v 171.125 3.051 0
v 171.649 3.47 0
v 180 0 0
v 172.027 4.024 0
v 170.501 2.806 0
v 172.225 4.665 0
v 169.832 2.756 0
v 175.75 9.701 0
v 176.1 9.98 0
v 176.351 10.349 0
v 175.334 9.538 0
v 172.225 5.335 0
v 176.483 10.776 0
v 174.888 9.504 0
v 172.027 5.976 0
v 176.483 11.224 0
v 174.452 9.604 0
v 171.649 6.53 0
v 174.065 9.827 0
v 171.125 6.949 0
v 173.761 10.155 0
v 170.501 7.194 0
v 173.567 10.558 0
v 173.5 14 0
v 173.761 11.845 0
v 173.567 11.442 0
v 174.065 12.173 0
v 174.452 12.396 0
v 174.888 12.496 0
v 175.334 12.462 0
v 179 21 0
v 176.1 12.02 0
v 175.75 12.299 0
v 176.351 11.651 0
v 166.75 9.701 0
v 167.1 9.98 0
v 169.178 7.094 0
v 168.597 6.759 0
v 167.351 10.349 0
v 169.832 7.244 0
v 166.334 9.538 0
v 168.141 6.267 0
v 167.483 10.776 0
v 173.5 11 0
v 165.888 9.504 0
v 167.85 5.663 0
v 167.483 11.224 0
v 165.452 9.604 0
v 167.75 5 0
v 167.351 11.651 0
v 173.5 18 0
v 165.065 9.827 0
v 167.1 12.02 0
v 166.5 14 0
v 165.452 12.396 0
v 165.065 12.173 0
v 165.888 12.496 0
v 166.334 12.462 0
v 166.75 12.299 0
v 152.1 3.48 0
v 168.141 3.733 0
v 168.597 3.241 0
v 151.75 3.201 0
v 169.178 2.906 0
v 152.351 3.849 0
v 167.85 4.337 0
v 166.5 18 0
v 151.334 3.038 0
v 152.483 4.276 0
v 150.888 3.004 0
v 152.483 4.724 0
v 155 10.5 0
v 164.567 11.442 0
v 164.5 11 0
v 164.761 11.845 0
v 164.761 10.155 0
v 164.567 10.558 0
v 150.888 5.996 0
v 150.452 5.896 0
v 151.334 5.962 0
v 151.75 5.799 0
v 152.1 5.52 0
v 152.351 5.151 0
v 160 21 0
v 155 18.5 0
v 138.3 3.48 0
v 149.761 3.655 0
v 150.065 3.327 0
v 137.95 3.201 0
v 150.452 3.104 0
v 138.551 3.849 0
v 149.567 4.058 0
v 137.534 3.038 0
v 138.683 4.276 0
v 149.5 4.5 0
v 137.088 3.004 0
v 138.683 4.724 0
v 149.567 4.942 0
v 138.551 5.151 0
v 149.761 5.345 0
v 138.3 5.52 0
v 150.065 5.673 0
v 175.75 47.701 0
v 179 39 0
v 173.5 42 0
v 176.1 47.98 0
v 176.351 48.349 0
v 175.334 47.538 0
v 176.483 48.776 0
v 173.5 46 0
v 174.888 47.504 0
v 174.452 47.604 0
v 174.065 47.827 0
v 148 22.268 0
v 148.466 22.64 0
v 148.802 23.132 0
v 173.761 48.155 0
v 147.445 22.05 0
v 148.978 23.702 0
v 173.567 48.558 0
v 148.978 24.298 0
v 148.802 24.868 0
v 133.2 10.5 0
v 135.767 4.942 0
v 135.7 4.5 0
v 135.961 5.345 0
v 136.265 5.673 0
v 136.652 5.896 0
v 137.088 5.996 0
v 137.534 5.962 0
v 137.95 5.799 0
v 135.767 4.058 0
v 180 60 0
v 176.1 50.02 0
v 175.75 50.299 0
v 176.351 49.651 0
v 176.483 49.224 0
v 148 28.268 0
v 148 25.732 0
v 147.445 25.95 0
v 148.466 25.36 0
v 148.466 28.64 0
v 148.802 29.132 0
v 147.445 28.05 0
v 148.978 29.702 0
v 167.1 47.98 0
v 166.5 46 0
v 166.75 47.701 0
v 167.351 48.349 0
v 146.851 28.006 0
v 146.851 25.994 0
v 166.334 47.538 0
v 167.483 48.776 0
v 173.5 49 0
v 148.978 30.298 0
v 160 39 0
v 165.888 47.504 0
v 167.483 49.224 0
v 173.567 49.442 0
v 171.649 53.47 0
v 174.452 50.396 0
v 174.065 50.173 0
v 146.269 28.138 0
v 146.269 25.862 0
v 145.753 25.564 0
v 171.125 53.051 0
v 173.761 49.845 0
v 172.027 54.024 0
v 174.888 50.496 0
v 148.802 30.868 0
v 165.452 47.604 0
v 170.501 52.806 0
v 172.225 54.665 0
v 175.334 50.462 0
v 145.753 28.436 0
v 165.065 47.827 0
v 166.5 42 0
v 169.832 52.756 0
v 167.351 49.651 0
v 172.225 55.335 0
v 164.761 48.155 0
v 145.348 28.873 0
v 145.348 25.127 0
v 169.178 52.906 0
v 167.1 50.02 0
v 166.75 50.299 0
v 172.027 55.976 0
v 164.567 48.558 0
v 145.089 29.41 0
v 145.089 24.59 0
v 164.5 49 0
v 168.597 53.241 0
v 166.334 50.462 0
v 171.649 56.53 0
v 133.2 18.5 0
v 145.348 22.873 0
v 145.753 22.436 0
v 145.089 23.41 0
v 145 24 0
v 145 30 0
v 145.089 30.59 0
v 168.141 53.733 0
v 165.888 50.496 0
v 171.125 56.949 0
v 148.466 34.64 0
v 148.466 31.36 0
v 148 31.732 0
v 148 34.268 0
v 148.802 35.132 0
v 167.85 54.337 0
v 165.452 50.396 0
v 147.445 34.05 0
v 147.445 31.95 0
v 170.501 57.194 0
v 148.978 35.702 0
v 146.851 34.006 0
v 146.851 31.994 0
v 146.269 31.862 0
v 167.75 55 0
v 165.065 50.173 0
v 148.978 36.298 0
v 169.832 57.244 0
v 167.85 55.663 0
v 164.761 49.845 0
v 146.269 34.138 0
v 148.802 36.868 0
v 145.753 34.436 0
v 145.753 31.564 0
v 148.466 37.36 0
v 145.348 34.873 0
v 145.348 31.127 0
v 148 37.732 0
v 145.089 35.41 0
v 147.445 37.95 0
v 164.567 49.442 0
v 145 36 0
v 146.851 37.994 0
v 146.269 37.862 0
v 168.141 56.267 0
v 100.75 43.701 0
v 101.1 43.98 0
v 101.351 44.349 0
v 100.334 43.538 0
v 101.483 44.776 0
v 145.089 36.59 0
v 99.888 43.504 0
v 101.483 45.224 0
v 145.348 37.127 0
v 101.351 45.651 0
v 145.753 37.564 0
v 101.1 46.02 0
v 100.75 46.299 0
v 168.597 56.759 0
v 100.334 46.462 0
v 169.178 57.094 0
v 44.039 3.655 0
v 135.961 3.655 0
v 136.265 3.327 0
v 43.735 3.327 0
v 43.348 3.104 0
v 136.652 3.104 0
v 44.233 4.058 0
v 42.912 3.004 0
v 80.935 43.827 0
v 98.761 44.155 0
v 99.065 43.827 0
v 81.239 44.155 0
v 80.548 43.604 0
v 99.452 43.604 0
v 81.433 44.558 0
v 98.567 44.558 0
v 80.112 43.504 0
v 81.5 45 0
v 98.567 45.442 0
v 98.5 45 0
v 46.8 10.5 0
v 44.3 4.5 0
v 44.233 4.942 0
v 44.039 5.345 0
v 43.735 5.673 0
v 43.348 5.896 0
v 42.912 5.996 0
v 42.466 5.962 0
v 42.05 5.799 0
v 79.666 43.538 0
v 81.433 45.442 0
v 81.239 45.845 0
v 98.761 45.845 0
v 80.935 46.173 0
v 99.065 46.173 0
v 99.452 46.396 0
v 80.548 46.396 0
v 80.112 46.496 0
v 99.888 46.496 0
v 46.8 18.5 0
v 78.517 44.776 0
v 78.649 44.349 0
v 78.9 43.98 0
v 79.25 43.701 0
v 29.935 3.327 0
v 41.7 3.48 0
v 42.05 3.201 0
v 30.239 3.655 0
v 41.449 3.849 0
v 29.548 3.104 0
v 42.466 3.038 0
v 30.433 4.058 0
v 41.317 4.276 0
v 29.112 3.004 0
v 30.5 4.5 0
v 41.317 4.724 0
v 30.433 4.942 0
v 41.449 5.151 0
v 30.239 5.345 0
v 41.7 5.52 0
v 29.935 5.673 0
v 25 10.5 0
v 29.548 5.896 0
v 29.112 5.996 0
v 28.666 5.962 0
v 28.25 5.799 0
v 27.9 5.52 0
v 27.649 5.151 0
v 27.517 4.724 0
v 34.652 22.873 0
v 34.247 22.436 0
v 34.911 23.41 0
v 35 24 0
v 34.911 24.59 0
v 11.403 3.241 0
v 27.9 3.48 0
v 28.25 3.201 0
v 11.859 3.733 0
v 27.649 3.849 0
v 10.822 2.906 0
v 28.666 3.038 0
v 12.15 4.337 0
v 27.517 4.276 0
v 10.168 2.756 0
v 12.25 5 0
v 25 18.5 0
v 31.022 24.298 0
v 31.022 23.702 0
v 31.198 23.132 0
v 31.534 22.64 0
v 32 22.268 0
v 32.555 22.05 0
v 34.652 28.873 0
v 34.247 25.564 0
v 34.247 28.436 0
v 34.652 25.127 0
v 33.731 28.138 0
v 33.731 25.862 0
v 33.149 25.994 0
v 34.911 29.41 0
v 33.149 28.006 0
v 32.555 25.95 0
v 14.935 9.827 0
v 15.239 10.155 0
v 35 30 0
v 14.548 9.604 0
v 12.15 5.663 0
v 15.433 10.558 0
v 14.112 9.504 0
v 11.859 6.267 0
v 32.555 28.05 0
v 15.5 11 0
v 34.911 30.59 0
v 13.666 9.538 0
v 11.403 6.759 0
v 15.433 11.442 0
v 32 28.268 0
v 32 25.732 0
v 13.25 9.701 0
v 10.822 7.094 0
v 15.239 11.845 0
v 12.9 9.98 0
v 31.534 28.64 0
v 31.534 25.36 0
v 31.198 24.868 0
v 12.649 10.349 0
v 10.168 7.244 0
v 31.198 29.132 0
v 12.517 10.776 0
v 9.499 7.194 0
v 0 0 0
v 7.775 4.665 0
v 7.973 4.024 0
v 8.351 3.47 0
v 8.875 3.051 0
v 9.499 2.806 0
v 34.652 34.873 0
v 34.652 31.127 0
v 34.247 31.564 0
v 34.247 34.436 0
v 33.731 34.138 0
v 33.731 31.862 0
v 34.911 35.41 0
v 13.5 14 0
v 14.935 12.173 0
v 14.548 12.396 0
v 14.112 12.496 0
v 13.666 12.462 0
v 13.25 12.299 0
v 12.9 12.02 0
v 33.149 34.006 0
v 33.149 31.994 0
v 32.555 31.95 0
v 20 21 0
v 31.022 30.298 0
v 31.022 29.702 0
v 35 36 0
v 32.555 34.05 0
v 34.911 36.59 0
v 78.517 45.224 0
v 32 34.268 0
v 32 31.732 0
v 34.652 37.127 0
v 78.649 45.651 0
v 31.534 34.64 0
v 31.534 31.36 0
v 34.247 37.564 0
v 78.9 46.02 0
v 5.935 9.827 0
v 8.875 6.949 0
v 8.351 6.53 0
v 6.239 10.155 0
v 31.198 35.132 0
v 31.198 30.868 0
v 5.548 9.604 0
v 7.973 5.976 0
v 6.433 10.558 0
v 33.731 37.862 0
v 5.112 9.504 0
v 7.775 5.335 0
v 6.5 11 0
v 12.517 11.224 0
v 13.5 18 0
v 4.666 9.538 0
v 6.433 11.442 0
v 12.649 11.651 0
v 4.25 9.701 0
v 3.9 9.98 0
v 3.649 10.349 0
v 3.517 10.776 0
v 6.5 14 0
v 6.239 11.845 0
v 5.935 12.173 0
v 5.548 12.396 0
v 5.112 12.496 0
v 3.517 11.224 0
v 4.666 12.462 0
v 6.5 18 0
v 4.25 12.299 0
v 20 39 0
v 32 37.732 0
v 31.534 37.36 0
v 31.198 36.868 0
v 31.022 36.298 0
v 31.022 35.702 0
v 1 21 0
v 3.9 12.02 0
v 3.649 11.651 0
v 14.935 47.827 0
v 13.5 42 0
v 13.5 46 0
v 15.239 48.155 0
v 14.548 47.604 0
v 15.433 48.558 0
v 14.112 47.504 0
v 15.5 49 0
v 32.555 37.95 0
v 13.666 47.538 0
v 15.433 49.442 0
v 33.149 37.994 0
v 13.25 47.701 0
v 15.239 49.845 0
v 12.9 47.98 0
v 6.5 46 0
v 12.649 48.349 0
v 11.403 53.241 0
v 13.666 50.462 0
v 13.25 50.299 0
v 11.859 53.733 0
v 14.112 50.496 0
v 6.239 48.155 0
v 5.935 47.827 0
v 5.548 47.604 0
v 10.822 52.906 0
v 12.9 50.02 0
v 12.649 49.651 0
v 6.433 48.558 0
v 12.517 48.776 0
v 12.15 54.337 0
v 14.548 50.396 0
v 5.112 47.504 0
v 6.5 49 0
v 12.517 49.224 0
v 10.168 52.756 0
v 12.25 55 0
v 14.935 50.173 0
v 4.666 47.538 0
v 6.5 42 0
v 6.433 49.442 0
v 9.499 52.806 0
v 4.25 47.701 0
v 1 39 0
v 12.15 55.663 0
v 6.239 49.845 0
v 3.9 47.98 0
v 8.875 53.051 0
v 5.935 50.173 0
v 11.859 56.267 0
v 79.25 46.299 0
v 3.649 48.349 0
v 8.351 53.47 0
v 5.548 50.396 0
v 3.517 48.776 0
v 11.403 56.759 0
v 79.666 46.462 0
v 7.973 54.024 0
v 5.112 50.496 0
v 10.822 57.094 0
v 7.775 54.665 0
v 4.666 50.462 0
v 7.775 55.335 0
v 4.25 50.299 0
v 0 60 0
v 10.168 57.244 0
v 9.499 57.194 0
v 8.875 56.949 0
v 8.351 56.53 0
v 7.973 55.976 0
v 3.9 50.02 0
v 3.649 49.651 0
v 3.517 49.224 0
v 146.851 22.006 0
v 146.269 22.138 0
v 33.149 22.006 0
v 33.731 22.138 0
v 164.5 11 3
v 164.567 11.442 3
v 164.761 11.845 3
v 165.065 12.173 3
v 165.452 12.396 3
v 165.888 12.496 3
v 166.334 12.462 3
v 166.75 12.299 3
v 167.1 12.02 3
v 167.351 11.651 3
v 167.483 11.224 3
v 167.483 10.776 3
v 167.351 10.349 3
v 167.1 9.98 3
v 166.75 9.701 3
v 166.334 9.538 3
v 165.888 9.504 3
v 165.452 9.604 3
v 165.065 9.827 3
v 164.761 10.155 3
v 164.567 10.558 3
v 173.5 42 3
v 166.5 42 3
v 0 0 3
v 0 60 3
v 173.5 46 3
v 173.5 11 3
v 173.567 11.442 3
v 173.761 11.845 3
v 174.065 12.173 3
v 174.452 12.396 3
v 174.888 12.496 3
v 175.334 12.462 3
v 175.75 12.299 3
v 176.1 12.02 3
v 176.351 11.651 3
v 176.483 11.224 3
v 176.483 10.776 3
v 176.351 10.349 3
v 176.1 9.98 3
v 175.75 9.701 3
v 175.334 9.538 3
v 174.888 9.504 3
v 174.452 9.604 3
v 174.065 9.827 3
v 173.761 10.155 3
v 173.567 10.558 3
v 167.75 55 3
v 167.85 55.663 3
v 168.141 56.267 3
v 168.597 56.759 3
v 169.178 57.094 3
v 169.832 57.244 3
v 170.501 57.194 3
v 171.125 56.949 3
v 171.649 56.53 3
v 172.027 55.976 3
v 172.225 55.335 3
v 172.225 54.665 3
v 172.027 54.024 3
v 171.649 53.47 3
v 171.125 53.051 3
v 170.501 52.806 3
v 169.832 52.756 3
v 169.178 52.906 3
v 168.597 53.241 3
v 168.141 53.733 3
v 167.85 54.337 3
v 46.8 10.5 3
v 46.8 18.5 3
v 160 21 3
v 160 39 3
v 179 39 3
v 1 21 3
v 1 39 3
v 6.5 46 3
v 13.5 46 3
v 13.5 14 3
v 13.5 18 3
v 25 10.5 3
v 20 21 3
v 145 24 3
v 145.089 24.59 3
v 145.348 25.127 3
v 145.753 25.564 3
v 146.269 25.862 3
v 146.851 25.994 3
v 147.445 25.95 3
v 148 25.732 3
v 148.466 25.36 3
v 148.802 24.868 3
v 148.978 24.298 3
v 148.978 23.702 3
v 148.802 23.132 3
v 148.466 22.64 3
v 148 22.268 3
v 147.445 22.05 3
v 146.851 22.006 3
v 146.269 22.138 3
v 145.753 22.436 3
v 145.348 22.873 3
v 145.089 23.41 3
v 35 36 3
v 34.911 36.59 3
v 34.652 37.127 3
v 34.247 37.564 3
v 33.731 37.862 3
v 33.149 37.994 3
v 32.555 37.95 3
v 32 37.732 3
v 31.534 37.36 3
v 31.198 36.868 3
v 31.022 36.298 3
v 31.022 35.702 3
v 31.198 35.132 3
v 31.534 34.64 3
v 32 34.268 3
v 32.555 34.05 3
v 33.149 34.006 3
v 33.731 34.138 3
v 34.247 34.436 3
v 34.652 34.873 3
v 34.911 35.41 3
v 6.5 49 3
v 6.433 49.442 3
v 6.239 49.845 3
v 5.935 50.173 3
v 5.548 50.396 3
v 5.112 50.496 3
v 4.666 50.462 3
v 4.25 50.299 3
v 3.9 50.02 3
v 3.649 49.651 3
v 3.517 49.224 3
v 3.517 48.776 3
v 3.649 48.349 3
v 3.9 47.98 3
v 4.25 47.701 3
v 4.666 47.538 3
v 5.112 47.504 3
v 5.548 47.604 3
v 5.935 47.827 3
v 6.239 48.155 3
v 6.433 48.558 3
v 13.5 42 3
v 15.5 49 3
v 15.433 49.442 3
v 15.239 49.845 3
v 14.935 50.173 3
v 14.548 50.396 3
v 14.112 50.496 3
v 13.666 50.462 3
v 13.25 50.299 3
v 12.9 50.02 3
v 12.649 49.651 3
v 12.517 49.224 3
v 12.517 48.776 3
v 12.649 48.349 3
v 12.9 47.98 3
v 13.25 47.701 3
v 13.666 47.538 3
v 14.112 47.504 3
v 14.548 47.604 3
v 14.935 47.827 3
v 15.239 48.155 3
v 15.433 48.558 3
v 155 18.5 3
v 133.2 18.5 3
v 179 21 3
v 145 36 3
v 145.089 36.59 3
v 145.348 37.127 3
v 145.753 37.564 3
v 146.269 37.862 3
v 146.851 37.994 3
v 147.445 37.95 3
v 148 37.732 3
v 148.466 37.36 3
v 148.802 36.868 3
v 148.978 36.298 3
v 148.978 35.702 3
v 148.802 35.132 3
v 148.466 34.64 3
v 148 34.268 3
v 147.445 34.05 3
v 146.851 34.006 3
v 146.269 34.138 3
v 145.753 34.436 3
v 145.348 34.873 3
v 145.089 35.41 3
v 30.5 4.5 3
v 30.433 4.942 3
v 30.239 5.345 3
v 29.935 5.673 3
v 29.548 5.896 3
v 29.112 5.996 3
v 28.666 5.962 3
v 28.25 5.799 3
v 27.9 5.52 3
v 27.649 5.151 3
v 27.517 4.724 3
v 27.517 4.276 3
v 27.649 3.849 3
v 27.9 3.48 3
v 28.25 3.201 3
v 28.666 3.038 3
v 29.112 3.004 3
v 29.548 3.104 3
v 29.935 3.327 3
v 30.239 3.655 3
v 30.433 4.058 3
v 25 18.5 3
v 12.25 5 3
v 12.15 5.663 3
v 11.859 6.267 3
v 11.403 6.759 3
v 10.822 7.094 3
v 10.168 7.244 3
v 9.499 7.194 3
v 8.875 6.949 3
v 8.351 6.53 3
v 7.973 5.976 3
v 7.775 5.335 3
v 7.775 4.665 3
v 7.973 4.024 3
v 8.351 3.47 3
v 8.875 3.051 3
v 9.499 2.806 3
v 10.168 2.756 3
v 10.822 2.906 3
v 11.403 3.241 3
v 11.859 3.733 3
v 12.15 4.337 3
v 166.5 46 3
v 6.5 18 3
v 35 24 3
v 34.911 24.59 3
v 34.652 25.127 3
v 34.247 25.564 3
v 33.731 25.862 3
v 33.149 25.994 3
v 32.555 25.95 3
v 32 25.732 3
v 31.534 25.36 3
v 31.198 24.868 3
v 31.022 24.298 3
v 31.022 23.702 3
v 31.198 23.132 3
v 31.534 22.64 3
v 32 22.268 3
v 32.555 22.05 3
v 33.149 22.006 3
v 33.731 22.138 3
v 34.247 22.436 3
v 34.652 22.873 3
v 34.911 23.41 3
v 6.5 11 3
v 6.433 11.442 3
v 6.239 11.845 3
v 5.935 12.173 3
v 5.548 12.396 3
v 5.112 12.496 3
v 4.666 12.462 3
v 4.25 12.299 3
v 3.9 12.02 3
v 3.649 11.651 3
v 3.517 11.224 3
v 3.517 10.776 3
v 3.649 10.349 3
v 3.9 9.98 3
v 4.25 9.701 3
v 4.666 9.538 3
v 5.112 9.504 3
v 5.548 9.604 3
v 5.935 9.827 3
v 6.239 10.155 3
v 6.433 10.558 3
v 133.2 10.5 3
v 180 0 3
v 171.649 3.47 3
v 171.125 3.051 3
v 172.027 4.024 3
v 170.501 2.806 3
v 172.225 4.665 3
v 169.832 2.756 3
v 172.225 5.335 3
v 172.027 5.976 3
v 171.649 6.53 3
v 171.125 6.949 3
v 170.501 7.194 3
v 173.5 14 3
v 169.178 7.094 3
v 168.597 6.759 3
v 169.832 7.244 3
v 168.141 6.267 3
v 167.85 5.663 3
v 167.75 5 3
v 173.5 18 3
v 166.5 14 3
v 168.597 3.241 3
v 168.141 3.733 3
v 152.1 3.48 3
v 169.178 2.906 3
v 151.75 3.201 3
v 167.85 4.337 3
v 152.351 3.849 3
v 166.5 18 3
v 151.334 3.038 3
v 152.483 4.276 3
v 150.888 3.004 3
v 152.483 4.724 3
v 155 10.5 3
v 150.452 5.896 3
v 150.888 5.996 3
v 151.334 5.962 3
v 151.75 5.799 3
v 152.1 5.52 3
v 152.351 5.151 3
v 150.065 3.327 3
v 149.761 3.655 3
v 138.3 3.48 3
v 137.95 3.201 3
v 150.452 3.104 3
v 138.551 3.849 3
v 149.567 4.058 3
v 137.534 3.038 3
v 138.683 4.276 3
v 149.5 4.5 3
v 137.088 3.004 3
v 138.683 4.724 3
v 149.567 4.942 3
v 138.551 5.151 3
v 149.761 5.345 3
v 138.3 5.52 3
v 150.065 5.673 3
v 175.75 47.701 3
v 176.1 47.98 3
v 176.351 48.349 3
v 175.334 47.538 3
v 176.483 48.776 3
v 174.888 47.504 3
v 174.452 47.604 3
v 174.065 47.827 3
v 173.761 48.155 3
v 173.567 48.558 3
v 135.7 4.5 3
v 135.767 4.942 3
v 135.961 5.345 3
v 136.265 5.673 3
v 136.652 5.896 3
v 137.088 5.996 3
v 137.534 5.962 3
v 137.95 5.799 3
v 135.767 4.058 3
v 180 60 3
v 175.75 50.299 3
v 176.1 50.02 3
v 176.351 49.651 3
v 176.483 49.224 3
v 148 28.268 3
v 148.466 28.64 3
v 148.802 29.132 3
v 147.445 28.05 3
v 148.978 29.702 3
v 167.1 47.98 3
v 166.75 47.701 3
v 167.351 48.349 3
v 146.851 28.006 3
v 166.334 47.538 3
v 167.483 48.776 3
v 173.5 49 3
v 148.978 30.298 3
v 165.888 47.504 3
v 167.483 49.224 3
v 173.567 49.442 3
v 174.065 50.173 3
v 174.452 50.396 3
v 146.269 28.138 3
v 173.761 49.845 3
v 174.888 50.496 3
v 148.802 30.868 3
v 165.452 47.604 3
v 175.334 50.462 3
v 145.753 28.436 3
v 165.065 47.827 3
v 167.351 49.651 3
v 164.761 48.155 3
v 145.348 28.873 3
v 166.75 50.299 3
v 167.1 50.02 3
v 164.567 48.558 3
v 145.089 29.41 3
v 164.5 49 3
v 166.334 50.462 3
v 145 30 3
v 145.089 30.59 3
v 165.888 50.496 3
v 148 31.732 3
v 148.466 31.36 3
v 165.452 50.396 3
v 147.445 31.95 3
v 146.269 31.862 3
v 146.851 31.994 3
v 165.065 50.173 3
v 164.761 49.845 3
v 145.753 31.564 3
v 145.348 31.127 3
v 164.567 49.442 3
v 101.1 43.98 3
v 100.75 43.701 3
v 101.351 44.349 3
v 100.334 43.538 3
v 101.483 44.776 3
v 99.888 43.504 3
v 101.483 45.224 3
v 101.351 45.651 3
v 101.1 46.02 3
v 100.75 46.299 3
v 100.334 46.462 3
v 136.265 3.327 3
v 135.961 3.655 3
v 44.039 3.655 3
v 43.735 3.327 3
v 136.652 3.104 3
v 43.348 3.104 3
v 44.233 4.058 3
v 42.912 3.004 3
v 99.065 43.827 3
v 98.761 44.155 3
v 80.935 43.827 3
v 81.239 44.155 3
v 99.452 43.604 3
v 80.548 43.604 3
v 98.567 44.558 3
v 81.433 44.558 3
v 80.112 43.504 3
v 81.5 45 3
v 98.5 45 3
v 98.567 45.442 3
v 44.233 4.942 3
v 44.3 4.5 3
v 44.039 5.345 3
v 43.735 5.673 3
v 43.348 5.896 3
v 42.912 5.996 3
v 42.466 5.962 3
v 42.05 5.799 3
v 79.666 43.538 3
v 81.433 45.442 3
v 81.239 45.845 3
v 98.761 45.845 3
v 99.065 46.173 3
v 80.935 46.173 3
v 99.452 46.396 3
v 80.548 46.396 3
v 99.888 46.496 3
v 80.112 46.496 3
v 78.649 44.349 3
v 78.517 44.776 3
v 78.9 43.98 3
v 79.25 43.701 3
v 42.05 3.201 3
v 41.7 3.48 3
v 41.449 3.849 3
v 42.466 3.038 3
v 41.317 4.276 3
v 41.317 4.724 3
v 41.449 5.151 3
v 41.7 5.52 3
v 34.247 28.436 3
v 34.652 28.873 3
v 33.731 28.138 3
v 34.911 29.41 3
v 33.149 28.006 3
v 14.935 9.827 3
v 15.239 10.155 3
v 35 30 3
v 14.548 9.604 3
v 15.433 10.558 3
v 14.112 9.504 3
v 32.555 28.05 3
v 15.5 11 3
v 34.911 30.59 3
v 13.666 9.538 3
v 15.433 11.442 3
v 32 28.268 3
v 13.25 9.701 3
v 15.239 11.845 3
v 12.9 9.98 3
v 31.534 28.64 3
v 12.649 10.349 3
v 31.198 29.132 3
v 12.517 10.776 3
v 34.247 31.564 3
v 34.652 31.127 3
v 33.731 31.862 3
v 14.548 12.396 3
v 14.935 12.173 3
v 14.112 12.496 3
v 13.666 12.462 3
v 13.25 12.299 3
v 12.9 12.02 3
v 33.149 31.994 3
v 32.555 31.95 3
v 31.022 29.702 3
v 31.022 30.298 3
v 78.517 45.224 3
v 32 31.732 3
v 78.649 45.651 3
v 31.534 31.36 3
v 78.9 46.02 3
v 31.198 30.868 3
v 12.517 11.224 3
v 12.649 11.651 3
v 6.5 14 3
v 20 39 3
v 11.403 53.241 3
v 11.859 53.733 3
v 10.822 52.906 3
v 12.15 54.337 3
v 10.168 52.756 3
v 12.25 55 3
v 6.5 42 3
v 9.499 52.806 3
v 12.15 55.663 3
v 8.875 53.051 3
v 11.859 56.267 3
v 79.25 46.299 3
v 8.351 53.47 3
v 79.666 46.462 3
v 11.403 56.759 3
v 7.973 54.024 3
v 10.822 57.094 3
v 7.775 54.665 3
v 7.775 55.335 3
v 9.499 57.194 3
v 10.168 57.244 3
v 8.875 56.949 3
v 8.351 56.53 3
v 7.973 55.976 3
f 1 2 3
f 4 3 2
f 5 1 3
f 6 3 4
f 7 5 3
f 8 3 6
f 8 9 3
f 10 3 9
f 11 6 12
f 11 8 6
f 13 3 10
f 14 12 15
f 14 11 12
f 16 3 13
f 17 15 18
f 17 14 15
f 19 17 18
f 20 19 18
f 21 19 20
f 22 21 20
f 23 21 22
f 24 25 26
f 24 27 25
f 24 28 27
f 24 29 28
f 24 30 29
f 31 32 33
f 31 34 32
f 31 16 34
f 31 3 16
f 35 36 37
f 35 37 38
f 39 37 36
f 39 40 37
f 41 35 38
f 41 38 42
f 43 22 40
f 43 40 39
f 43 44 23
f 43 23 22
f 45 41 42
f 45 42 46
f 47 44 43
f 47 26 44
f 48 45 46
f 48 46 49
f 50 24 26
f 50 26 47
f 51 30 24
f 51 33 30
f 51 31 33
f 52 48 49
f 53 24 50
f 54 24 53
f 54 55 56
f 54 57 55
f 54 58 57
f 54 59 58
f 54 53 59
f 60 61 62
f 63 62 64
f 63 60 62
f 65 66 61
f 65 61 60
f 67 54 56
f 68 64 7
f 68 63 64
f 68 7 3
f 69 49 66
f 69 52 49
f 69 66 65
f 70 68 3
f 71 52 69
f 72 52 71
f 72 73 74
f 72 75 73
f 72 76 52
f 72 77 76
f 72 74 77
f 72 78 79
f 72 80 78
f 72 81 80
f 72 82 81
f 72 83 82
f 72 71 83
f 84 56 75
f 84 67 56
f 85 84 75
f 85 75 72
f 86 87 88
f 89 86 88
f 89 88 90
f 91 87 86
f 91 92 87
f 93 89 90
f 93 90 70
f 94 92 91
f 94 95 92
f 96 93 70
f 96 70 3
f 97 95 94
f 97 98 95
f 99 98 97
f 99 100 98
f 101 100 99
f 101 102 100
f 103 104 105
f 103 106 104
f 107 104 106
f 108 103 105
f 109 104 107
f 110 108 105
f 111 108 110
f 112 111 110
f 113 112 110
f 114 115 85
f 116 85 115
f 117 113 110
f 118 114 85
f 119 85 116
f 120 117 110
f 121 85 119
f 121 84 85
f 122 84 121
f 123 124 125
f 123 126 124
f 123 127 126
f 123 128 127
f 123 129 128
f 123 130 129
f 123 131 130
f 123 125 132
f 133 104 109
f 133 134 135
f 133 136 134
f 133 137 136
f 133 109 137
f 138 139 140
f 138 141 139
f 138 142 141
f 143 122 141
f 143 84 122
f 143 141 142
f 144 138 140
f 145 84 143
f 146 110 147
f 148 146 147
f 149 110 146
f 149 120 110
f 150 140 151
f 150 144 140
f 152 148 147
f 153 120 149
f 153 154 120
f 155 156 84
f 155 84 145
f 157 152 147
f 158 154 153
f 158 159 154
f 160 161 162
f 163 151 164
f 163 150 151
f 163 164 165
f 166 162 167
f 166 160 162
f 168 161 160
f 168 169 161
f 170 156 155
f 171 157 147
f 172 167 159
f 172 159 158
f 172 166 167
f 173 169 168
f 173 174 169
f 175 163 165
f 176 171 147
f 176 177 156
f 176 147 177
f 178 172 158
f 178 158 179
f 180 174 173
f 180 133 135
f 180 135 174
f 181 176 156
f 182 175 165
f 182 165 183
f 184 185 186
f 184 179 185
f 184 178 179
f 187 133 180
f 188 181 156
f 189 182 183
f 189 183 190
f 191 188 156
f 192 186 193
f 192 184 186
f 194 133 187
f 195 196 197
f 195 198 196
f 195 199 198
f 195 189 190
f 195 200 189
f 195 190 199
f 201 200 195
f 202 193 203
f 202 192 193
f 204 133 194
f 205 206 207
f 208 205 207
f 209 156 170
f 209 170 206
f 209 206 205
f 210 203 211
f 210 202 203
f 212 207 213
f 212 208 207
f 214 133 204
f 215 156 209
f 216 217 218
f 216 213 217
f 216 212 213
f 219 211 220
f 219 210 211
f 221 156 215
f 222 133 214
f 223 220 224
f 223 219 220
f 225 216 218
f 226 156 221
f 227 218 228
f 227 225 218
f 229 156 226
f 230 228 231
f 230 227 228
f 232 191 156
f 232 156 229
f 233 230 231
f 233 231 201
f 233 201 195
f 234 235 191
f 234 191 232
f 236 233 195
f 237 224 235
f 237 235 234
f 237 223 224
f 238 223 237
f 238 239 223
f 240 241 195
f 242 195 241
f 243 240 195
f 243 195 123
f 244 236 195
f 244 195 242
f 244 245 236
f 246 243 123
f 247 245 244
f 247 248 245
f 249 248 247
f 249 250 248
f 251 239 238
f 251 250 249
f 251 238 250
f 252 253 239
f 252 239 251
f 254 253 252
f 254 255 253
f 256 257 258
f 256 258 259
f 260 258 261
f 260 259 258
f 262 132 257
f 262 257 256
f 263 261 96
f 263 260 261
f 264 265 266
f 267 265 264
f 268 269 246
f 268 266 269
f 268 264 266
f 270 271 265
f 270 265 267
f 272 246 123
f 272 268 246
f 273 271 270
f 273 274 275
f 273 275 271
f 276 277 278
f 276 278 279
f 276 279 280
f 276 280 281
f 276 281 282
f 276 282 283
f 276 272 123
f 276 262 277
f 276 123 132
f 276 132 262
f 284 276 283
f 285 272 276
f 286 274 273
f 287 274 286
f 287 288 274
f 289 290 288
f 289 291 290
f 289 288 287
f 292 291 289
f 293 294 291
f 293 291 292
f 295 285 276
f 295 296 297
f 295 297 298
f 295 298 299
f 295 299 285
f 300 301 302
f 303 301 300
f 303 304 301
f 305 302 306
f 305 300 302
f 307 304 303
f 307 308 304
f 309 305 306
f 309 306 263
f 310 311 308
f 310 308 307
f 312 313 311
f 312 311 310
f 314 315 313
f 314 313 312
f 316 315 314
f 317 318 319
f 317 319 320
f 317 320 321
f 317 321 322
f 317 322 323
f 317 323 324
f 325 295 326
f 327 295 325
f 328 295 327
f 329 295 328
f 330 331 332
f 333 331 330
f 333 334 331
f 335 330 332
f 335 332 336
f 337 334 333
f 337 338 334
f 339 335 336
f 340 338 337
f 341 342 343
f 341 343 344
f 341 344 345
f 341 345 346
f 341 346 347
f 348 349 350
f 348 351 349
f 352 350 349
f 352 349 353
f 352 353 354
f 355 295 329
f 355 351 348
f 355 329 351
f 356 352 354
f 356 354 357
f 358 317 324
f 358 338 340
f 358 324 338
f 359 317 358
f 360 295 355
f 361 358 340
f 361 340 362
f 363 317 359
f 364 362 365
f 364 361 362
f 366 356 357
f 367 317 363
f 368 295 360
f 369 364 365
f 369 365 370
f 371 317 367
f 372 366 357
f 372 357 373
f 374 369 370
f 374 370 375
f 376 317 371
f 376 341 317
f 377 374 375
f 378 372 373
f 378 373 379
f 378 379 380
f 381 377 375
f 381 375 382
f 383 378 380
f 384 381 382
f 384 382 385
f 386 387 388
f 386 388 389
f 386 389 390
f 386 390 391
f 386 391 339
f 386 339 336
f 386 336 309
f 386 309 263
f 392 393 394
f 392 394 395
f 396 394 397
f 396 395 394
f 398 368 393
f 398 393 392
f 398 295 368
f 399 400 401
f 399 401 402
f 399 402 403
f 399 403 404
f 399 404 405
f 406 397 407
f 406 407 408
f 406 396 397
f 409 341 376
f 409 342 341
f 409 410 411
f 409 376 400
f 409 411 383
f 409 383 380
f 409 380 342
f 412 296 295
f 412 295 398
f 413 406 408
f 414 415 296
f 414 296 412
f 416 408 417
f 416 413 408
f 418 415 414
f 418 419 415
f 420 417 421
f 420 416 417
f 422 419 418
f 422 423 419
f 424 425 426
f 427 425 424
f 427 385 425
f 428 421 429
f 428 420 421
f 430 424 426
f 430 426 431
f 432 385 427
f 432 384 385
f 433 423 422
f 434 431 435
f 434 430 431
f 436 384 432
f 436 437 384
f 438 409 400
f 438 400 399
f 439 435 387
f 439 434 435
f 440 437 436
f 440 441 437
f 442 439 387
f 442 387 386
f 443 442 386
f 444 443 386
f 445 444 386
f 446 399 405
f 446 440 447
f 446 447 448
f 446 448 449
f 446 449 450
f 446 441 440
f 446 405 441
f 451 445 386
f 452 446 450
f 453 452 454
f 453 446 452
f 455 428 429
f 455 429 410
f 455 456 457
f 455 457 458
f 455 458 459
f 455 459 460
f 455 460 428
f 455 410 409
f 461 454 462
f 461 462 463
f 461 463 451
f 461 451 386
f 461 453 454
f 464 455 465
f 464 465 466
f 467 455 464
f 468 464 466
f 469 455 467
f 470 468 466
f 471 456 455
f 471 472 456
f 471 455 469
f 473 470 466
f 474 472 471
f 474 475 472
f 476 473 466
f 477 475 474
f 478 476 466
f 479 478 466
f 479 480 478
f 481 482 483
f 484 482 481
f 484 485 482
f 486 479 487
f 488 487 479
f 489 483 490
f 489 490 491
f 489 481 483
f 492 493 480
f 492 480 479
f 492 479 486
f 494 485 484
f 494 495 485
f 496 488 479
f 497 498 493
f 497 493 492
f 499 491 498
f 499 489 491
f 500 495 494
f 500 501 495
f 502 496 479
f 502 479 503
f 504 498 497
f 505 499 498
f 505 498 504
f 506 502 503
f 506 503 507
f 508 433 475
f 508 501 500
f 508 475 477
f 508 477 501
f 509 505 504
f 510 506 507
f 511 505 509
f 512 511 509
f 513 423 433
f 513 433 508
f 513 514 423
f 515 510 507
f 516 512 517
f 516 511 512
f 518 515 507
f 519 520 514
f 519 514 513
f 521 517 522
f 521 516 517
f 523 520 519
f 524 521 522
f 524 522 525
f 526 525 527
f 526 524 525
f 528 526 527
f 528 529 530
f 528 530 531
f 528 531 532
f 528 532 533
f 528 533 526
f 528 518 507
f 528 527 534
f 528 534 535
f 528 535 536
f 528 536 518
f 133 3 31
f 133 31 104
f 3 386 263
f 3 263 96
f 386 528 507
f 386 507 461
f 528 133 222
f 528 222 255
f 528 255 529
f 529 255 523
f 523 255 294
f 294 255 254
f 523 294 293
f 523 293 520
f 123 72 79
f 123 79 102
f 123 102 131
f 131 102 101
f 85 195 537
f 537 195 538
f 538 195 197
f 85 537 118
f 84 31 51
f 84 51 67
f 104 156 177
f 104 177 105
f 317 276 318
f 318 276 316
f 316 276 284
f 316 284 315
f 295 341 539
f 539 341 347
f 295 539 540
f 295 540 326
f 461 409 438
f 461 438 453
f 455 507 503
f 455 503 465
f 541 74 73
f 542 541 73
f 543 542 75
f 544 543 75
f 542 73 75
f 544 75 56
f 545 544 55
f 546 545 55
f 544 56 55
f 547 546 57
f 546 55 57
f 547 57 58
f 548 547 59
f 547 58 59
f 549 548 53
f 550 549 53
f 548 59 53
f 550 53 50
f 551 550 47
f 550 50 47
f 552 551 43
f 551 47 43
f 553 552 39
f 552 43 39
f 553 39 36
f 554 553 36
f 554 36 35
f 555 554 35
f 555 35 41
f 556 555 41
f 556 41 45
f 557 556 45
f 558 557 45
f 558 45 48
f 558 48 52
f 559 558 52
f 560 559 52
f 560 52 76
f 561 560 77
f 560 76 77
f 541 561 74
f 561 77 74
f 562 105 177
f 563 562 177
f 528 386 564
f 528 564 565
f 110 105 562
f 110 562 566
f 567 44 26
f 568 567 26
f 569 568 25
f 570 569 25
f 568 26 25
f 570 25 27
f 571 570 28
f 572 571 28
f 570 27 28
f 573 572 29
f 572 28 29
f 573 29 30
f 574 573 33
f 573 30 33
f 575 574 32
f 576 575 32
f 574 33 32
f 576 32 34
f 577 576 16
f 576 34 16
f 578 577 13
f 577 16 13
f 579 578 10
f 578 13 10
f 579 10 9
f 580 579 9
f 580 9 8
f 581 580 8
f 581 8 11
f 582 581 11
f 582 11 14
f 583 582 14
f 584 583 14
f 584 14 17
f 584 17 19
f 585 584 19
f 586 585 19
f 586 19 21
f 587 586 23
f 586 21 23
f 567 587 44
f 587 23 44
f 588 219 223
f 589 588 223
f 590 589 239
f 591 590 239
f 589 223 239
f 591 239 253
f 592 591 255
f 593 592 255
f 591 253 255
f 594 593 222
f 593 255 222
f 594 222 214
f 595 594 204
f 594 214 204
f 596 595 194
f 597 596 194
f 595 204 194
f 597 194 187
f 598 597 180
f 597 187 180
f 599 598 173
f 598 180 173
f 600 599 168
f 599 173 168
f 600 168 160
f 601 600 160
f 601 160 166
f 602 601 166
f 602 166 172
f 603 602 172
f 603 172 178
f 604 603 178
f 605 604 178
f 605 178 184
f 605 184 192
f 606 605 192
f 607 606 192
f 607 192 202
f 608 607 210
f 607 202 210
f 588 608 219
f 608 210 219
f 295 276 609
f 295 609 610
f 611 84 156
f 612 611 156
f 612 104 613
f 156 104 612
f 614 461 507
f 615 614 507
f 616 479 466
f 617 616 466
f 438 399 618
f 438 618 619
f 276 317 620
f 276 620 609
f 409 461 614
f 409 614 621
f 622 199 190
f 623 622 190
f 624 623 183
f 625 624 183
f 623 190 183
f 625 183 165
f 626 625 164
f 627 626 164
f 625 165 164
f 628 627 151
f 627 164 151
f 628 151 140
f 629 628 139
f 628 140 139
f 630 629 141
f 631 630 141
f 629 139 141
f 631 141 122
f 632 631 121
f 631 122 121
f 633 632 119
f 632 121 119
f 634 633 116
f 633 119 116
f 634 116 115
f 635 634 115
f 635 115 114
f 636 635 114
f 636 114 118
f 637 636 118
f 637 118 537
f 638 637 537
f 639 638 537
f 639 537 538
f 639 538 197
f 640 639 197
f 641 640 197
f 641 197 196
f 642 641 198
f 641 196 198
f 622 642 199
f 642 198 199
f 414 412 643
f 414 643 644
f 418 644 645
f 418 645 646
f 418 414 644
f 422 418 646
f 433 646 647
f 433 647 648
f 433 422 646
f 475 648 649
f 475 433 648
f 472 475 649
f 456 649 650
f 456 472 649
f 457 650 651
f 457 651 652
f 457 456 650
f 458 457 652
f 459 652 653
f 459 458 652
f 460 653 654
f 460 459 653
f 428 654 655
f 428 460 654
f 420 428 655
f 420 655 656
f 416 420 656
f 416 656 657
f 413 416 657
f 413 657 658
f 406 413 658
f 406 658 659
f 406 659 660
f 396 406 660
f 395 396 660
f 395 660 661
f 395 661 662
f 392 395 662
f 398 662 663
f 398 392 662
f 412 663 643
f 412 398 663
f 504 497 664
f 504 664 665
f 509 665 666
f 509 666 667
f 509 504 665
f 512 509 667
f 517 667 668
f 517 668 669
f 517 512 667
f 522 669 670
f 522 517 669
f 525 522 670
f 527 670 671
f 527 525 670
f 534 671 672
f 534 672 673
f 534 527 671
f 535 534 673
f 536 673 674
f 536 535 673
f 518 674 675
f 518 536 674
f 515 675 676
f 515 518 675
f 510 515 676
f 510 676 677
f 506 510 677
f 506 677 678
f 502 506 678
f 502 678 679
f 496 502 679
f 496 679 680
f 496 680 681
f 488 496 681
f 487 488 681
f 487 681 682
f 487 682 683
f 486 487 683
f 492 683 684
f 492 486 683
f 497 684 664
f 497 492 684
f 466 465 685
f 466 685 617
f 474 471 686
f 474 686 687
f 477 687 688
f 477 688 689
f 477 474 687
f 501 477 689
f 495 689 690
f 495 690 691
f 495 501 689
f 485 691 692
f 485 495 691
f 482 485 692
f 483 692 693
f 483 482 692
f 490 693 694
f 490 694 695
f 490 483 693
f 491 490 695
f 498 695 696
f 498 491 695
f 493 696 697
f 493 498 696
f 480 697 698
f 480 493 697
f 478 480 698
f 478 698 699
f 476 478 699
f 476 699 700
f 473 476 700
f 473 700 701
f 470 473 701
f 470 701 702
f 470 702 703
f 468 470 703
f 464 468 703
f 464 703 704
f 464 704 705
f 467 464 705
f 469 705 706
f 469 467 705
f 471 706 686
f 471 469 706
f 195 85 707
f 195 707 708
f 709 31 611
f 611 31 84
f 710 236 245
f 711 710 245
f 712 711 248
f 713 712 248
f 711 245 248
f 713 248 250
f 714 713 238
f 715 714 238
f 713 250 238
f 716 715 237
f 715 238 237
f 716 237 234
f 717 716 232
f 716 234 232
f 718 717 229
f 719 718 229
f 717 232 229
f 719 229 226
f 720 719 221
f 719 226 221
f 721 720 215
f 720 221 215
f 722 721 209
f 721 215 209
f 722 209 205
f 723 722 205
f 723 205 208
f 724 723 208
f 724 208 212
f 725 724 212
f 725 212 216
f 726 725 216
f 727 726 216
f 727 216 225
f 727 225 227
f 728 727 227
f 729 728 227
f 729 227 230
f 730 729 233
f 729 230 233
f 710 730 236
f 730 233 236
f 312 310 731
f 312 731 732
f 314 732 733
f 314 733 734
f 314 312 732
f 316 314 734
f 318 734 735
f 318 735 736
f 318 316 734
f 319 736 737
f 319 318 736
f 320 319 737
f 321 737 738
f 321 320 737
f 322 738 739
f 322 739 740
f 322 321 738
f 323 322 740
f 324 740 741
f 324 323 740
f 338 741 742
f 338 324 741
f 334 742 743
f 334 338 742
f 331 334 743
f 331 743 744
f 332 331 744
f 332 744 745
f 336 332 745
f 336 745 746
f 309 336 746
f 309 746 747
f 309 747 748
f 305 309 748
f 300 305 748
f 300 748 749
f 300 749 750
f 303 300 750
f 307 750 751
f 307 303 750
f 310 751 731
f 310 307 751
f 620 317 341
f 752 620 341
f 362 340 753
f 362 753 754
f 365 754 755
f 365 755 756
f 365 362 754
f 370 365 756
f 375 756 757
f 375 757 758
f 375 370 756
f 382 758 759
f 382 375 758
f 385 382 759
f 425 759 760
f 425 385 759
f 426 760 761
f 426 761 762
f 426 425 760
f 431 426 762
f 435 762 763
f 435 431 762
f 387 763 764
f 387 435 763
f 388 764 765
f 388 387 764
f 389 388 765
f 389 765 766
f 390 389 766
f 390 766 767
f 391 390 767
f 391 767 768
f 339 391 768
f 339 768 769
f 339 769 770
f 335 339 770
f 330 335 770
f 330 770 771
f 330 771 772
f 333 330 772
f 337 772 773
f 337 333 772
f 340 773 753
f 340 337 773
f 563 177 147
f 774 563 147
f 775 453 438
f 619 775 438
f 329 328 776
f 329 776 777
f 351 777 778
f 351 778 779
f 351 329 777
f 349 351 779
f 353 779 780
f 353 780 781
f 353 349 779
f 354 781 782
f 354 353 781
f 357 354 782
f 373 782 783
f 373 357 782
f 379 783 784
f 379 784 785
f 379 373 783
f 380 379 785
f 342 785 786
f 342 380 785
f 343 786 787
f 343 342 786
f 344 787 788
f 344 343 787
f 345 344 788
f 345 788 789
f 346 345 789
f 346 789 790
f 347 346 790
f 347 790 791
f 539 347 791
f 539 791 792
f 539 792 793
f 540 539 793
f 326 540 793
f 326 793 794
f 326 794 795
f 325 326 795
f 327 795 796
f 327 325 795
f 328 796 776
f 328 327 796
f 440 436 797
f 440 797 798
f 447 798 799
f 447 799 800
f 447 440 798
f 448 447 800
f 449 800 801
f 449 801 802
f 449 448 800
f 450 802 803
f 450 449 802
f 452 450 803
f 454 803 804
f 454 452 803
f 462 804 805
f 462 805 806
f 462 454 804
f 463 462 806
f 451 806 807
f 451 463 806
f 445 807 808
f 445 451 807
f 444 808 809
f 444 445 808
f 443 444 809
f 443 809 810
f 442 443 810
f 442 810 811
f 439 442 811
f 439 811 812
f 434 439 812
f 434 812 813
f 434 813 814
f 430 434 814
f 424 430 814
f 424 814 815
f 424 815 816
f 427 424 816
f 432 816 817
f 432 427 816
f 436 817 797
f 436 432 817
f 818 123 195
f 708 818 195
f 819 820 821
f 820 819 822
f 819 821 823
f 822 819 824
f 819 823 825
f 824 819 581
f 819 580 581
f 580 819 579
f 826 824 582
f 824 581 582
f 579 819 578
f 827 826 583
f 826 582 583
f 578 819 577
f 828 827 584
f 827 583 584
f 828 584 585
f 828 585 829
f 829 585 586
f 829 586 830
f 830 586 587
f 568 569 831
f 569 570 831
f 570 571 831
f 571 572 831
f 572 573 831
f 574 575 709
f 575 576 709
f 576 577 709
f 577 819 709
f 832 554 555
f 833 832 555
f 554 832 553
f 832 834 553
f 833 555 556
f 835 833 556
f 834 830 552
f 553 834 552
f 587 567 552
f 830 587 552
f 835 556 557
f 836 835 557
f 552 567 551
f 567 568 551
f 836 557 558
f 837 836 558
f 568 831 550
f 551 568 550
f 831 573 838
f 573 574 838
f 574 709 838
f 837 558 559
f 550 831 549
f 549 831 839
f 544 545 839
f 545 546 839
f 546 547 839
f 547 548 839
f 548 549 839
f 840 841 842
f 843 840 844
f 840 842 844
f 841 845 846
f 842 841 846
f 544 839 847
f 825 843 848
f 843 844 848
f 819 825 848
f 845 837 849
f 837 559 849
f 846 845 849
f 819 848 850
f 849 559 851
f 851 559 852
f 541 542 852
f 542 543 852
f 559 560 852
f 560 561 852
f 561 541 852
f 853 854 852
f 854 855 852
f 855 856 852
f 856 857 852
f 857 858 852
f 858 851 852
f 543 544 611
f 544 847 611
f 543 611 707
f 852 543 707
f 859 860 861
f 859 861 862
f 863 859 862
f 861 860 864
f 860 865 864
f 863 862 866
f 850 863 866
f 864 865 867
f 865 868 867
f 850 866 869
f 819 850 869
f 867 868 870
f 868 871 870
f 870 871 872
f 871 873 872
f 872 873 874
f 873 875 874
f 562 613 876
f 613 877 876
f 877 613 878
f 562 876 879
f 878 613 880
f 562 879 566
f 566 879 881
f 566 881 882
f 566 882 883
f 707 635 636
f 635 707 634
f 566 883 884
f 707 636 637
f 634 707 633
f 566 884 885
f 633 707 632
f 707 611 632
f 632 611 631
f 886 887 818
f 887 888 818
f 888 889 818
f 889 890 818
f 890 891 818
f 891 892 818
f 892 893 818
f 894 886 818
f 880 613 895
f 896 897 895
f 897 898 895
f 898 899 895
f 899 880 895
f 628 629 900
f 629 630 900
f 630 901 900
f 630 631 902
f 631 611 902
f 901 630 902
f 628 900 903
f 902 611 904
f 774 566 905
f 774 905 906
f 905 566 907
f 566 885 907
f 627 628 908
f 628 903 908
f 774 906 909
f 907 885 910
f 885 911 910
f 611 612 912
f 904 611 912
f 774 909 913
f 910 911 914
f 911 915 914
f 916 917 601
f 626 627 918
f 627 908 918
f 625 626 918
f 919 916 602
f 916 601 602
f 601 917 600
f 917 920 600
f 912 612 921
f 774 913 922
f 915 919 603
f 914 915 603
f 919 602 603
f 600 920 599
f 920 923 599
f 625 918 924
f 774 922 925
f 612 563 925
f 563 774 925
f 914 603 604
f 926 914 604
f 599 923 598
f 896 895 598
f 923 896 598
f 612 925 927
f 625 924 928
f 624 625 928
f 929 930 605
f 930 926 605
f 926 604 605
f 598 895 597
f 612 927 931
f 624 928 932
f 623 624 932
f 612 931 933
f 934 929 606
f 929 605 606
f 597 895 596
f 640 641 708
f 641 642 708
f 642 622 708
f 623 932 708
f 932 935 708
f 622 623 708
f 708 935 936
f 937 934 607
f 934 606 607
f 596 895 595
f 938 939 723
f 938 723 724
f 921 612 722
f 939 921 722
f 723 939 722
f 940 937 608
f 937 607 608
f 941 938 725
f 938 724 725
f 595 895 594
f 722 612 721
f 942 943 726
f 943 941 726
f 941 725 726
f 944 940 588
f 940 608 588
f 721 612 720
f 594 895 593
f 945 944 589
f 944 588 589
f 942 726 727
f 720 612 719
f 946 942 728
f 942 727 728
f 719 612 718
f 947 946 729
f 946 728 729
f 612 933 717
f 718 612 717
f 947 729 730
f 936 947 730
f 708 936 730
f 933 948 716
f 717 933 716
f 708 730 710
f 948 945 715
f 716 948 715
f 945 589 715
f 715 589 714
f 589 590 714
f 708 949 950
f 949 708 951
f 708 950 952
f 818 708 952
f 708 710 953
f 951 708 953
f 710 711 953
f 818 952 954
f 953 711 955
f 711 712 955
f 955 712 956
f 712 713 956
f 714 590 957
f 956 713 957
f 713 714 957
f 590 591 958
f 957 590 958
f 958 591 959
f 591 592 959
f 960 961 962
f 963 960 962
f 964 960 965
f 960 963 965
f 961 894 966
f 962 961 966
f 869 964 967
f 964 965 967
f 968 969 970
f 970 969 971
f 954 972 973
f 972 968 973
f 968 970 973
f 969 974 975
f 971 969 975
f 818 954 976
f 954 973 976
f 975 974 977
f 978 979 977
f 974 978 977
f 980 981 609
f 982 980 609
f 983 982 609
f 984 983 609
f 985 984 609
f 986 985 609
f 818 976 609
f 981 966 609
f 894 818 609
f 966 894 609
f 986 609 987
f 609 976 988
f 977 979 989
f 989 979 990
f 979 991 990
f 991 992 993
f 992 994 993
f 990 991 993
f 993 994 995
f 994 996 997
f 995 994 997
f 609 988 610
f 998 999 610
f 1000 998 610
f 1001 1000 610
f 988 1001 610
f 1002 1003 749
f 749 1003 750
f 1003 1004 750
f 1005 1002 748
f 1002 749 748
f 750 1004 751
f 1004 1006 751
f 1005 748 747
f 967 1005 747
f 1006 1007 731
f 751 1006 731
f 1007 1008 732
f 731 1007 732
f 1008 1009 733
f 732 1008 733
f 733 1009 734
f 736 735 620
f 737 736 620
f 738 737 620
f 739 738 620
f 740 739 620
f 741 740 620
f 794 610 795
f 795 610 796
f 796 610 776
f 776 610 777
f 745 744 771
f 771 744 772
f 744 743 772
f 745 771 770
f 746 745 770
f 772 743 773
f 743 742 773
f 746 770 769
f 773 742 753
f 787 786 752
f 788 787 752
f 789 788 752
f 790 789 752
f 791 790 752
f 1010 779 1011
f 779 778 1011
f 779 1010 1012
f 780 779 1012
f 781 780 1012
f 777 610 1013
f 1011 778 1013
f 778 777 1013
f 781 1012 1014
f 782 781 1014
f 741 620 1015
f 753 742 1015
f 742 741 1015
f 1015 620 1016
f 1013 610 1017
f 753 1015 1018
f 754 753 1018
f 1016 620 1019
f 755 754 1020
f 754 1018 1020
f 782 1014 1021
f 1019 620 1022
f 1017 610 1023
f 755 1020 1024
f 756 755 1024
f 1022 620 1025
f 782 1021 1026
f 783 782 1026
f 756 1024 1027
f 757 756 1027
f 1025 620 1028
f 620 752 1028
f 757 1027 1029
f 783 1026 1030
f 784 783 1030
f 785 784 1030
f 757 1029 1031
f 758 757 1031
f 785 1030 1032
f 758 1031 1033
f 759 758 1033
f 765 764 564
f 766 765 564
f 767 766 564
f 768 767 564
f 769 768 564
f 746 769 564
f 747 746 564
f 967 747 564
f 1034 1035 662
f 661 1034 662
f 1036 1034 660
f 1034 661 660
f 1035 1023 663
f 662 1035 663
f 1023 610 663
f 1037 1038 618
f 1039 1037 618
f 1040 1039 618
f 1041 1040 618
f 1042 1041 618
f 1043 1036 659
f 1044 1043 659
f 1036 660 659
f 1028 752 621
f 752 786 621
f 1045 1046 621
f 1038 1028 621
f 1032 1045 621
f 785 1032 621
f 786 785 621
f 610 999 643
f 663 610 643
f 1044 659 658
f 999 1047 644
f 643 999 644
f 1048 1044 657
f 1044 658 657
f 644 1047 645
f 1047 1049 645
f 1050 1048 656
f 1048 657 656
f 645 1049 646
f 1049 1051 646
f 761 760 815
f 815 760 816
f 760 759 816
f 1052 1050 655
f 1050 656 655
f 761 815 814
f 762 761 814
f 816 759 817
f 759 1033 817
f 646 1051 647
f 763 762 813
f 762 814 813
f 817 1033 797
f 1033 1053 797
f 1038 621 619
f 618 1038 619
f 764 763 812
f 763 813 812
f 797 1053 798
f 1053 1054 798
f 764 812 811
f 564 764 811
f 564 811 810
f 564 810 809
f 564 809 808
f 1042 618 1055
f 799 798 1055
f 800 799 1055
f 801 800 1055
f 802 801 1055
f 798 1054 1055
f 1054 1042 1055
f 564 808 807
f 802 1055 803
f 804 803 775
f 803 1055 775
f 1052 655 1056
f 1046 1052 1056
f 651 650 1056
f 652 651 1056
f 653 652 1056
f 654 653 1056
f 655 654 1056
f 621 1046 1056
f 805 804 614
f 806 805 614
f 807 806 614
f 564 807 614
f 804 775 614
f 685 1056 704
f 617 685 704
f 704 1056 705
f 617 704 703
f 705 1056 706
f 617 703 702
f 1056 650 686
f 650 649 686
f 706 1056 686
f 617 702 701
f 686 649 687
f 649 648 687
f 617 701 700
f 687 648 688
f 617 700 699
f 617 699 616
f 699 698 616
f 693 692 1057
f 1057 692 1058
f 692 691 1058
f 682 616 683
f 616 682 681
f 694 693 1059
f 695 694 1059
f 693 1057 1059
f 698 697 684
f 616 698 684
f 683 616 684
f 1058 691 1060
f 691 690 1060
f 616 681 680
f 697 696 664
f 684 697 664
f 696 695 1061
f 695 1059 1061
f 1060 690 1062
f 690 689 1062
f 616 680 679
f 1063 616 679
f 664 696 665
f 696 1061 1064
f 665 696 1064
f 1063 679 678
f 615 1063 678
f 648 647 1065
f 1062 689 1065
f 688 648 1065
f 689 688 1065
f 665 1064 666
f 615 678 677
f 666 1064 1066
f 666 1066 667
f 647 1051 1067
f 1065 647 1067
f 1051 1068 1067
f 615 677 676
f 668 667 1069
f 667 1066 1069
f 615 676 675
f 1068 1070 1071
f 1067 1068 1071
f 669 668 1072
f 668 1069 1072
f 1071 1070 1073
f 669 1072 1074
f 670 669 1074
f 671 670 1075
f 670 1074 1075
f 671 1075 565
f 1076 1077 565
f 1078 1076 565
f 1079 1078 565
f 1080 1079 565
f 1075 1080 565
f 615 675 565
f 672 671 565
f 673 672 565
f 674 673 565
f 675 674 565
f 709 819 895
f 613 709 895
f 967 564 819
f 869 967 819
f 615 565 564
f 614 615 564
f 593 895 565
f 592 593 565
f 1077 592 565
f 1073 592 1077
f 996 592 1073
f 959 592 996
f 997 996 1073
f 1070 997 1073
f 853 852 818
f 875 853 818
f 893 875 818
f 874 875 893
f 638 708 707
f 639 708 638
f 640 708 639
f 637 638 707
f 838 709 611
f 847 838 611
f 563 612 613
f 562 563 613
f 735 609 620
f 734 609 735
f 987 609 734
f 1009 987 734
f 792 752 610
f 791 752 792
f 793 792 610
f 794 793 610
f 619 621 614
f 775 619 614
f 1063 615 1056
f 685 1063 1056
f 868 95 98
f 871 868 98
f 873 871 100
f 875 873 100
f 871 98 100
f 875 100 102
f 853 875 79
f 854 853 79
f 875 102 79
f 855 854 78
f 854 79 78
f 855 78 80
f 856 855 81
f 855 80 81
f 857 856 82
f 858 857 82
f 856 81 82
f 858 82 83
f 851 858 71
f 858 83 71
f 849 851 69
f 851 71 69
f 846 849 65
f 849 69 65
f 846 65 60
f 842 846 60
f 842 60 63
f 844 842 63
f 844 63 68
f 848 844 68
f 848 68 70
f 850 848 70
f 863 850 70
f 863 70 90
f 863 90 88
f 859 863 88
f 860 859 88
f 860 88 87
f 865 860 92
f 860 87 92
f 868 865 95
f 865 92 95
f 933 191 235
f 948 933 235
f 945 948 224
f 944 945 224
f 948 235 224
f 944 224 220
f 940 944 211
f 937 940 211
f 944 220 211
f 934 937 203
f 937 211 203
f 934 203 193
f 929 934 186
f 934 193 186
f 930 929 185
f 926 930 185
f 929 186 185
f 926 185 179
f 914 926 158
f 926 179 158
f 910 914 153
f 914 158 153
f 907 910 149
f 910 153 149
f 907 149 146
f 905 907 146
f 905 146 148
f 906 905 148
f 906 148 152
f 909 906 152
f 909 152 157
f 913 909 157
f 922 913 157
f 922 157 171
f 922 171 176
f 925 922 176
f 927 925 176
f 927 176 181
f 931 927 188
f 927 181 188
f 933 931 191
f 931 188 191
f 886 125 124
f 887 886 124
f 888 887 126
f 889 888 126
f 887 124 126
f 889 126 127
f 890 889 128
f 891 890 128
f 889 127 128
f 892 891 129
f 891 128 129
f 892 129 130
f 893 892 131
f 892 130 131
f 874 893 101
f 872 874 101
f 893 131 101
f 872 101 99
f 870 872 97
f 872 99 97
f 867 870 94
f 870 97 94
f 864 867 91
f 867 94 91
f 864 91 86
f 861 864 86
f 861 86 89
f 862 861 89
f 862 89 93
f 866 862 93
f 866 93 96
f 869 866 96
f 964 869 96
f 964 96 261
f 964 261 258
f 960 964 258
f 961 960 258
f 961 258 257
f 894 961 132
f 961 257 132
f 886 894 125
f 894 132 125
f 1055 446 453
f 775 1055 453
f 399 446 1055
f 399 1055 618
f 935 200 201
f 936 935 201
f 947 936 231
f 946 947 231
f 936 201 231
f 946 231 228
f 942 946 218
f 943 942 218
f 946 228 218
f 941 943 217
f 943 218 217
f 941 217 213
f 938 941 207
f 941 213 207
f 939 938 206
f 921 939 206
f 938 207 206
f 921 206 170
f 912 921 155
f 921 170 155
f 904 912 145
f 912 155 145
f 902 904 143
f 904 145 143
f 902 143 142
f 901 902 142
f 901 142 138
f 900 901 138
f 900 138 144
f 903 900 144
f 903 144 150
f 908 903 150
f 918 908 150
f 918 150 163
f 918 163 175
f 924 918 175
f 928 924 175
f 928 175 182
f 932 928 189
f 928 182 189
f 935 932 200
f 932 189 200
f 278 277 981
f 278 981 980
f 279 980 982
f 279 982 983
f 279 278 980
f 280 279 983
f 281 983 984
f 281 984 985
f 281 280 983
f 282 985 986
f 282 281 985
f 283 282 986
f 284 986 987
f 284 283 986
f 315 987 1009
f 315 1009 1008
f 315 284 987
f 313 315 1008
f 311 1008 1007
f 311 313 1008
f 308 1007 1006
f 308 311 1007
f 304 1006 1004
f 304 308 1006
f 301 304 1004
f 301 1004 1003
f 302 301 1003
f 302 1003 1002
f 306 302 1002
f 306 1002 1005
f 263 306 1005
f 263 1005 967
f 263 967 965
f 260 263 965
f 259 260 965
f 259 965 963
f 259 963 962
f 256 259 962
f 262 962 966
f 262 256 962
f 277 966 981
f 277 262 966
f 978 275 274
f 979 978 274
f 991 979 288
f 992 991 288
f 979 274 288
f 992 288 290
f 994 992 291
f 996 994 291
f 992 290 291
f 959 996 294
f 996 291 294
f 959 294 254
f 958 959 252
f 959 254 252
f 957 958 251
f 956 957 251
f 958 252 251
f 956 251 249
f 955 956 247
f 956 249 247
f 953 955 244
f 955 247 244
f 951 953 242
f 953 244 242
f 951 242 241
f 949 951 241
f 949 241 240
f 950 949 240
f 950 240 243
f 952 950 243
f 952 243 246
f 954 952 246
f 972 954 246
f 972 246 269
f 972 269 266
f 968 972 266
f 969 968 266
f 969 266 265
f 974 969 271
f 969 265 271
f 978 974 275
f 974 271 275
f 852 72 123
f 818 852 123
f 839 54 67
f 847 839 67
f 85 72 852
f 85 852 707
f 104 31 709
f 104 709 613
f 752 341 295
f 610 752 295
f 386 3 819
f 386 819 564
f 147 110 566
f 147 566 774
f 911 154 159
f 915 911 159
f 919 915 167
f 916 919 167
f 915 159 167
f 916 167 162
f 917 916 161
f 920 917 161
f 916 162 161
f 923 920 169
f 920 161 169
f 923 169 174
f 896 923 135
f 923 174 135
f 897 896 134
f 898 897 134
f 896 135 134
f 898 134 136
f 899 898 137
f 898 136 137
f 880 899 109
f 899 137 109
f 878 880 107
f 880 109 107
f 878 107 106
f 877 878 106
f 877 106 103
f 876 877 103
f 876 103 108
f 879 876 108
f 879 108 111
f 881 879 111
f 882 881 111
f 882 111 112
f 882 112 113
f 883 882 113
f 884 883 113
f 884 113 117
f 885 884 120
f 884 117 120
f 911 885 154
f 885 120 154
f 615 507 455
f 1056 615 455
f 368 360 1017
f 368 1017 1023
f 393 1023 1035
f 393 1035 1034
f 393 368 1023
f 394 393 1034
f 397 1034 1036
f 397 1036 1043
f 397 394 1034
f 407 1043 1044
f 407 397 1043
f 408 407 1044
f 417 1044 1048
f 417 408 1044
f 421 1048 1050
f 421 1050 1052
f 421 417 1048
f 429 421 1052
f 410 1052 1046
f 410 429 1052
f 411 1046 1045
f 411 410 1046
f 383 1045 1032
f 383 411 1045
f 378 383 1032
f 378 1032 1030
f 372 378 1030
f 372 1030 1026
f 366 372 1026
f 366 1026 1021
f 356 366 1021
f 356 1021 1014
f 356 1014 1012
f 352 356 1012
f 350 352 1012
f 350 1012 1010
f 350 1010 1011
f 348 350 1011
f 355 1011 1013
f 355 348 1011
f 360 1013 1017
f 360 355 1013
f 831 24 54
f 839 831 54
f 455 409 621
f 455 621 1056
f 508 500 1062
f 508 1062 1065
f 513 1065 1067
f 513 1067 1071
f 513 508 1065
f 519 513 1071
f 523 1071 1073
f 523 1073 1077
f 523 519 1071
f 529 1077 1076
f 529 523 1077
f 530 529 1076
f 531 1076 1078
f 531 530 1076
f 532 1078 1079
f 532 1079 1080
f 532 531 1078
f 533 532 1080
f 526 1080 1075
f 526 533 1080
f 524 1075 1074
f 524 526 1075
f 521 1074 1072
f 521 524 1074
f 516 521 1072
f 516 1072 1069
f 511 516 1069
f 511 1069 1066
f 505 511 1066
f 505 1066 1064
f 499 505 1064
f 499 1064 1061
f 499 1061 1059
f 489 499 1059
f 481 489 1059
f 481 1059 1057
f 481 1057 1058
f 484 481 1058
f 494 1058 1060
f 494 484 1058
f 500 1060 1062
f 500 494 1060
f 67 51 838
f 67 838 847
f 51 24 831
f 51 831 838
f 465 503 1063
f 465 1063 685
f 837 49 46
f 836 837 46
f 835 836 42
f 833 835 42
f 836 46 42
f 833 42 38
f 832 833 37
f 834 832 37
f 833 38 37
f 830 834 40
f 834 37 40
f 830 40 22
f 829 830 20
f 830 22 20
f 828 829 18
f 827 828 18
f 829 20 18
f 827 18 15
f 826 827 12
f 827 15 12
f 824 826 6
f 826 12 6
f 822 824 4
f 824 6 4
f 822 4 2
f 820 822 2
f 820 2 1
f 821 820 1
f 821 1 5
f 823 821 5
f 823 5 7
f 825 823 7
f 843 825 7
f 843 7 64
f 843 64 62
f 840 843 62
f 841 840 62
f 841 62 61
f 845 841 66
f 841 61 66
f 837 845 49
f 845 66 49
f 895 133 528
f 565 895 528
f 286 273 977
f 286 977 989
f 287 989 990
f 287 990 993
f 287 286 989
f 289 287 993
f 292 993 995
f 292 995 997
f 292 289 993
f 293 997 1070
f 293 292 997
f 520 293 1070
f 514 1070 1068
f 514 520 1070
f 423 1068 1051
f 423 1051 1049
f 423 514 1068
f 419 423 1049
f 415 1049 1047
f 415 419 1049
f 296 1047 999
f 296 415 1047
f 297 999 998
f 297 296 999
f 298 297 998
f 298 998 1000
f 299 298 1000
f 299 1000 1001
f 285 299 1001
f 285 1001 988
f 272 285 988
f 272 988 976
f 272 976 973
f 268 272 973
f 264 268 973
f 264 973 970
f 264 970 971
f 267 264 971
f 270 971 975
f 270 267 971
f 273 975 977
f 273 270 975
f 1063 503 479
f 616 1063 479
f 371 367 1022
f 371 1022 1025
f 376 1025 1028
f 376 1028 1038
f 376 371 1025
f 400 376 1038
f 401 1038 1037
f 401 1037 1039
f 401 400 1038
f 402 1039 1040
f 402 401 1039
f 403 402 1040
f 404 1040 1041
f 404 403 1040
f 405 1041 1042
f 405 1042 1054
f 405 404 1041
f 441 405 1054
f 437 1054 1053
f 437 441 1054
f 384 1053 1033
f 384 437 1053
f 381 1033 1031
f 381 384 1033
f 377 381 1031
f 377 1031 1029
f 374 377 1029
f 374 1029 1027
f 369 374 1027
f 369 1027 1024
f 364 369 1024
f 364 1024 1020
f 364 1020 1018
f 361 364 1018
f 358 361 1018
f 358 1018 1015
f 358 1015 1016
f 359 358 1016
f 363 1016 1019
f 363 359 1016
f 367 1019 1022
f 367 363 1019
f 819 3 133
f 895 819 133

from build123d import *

# Parameters (mm, degrees)
SKETCH_W   = 90
SKETCH_H   = 60
SKETCH_R   = 2.25
SKETCH_R_2 = 2
SKETCH_R_3 = 1.5
SKETCH_W_2 = 7
SKETCH_H_2 = 4
SKETCH_W_3 = 19
SKETCH_H_3 = 18
SKETCH_W_4 = 21.8
SKETCH_H_4 = 8
PAD_DEPTH  = 3


with BuildPart() as part:
    # Sketch → Pad (new body)
    with BuildSketch(Plane.XY):
        with Locations((45, 30)):
            Rectangle(SKETCH_W, SKETCH_H)
        with Locations((10, 5)):
            Circle(SKETCH_R, mode=Mode.SUBTRACT)
        with Locations((33, 24)):
            Circle(SKETCH_R_2, mode=Mode.SUBTRACT)
        with Locations((33, 36)):
            Circle(SKETCH_R_2, mode=Mode.SUBTRACT)
        with Locations((33, 30)):
            Circle(SKETCH_R_2, mode=Mode.SUBTRACT)
        with Locations((10, 55)):
            Circle(SKETCH_R, mode=Mode.SUBTRACT)
        with Locations((14, 11)):
            Circle(SKETCH_R_3, mode=Mode.SUBTRACT)
        with Locations((5, 11)):
            Circle(SKETCH_R_3, mode=Mode.SUBTRACT)
        with Locations((14, 49)):
            Circle(SKETCH_R_3, mode=Mode.SUBTRACT)
        with Locations((5, 49)):
            Circle(SKETCH_R_3, mode=Mode.SUBTRACT)
        with Locations((80, 45)):
            Circle(SKETCH_R_3, mode=Mode.SUBTRACT)
        with Locations((29, 4.5)):
            Circle(SKETCH_R_3, mode=Mode.SUBTRACT)
        with Locations((42.8, 4.5)):
            Circle(SKETCH_R_3, mode=Mode.SUBTRACT)
        with Locations((10, 16)):
            Rectangle(SKETCH_W_2, SKETCH_H_2, mode=Mode.SUBTRACT)
        with Locations((10, 44)):
            Rectangle(SKETCH_W_2, SKETCH_H_2, mode=Mode.SUBTRACT)
        with Locations((10.5, 30)):
            Rectangle(SKETCH_W_3, SKETCH_H_3, mode=Mode.SUBTRACT)
        with Locations((35.9, 14.5)):
            Rectangle(SKETCH_W_4, SKETCH_H_4, mode=Mode.SUBTRACT)
    pad = extrude(amount=PAD_DEPTH)

    # Mirrored: Pad across face of Pad
    add(pad.mirror(Plane(origin=(90, 30, 1.5), x_dir=(0, 1, 0), z_dir=(1, 0, 0))))


solid = part.part
